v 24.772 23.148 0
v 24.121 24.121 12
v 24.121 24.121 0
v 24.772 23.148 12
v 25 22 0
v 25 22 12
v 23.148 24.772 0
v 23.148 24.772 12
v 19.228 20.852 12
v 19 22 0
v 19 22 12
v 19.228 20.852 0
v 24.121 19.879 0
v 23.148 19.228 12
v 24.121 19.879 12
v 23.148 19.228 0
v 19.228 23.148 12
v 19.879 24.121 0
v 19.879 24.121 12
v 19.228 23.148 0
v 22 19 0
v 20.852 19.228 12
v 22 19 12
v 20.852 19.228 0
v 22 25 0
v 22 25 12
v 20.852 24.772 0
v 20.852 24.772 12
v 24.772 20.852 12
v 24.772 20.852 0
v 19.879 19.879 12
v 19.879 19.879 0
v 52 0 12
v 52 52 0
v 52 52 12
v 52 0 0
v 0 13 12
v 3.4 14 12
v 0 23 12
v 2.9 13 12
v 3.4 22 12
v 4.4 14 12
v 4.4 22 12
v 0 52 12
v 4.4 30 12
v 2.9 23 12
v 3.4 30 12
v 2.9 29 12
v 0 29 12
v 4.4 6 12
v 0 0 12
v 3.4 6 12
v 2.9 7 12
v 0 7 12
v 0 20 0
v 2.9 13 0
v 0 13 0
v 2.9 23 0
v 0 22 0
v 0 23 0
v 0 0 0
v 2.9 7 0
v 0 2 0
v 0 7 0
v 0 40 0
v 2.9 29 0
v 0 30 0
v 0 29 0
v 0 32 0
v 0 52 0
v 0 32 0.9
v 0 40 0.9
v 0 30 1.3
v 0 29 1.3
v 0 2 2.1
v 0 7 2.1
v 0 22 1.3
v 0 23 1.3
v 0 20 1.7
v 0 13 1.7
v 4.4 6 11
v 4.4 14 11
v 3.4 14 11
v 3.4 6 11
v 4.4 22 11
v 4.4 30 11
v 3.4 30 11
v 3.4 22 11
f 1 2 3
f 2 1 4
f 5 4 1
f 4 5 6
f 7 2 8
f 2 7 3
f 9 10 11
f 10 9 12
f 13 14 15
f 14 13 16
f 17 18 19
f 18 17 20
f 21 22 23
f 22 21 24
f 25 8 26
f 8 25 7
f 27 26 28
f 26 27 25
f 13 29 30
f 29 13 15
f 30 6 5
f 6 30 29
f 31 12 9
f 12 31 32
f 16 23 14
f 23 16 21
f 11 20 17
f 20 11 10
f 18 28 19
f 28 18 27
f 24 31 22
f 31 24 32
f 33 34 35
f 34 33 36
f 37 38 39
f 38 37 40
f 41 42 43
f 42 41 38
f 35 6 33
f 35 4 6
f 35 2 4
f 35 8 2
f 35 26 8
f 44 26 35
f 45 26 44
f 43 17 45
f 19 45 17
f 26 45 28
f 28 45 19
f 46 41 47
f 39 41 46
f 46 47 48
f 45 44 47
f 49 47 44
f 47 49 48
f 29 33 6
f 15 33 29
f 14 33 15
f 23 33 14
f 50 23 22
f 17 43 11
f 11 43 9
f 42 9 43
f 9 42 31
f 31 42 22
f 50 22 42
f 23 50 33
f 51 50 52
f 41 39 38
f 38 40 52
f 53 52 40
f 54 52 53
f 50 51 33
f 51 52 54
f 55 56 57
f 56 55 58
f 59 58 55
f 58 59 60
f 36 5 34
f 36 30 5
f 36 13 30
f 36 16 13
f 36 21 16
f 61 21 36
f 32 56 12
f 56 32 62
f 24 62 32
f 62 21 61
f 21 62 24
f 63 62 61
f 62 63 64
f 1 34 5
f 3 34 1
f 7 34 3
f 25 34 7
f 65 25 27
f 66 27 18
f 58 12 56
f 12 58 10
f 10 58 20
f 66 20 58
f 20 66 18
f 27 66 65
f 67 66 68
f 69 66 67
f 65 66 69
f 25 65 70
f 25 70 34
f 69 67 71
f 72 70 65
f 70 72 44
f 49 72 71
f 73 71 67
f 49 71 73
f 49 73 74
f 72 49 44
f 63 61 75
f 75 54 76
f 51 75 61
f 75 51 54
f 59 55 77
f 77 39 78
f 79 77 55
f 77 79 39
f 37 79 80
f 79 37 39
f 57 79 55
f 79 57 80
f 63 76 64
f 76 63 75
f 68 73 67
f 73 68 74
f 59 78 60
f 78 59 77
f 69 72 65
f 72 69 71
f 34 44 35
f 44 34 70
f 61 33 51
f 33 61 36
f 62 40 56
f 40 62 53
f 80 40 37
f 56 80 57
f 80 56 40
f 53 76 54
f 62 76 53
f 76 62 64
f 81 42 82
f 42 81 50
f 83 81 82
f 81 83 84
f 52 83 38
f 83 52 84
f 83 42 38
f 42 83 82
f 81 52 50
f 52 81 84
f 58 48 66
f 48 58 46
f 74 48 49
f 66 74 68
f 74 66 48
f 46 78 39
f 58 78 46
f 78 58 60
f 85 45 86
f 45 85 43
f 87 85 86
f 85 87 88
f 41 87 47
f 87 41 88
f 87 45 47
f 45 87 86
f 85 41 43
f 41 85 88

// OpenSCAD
// Dock-Homing Receiver Fit Jig — 2x TSOP38238 pair template
// ===========================================================================
// Fit-check jig for the BOM "Dock homing sensor" (BOM.md line 57: custom PCB
// with 2x TSOP38238 IR receivers). Tests, against the ACTUAL purchased
// TSOP38238 modules:
//   (a) the datasheet-cited package envelope (5.0 x 4.8 x 6.95 mm) — a
//       drop-through pair template; both modules must drop cleanly through;
//   (b) the receiver PAIR spacing rx_pitch (the critical dock-centering dim) —
//       both modules must drop through simultaneously to register the spacing;
//   (c) FR4 thickness assumption for the eventual chassis pocket — feeler
//       steps 0.8 / 1.2 / 1.6 / 2.0 mm.
//
// Parameter provenance mirrors dock-homing-sensor.scad:
//   tsop_w = 5.0, rxsop_d = 4.8, tsop_h = 6.95 — (datasheet: Vishay TSOP382/384,
//   Doc 82491 rev 2.1, fetched 2026-08-15)
//   tsop_pin_pitch = 2.54 — (datasheet)
//   rx_pitch = 16 — (estimate, re-derive from dock IR design; Jig 16 pass/fail)
//   pcb_thick = 1.6 — (estimate FR4)
// Everything else (estimate) — tune to your printer + actual part.
//
// Pass criteria + fail→fix mapping: PRINT-TEST.md Jig 16.
// License: CC BY-SA 4.0

$fn = 64;

/* [Template dimensions — EDIT] */
tsop_w      =  5.0;   // (datasheet) TSOP38238 package W
rxsop_d     =  4.8;   // (datasheet) TSOP38238 package D (boresight depth)
tsop_h      =  6.95;  // (datasheet) TSOP38238 package H
clear       =  0.5;   // (estimate) PER-SIDE slot clearance: opening = body + 2*clear
                      //   Start 0.5mm; tight→0.3, loose→0.7 (see Jig 16)
pin_pitch   =  2.54;  // (datasheet) lead pitch
rx_pitch    = 16.0;   // (estimate) receiver center-to-center spacing to verify:

// --- Thickness feeler steps ---
step_width  =  8.0;   // mm (estimate) per-step slot width
step_gap    =  2.0;   // mm (estimate)
step_list   = [0.8, 1.2, 1.6, 2.0];  // mm FR4 candidate thicknesses

// --- Template plate ---
plate_xy    = 52;    // footprint (mm)
plate_z     = 12;    // thickness (mm) — drop-through depth, > tsop_h so the
                      //   module fully passes and pokes out both sides

module plate() {
    difference() {
        cube([plate_xy, plate_xy, plate_z]);   // z 0..plate_z
        for (dx = [-1, 1], dy = [-1, 1])
            translate([dx * (plate_xy/2 - 4), dy * (plate_xy/2 - 4), -1])
                cylinder(d = 6, h = plate_z + 2, $fn = 16);
    }
}

module receiver_slot(cy = 0) {
    // Drop-through slot: opening tsop_w x tsop_d (+ 2*clear per side) with a
    // lead-pass channel on the -X (rear) face for the 3 leads on 2.54 pitch
    // (pinning 1=OUT, 2=GND, 3=VS per datasheet). Full plate depth.
    translate([-rxsop_d/2 - clear, cy - tsop_w/2 - clear, -0.1])
        cube([rxsop_d + 2*clear, tsop_w + 2*clear, plate_z + 0.2]);
    // lead channel (through): 4.0 wide in Y, at the rear face
    translate([-rxsop_d/2 - clear - 2.5, cy - 2.0, -0.1])
        cube([2.5, 4.0, plate_z + 0.2]);
    // window-side datum marker: engraved recess on the front (+X) edge so
    // operators insert modules window-first (boresight +X) consistently.
    // Punches through the top surface so it renders as a true recess (a
    // fully-internal subtracted cube would export as a detached shell).
    translate([rxsop_d/2 + clear + 0.5, cy - 4, plate_z - 1.0])
        cube([1.0, 8.0, 1.2]);
}

function cy_place(i) = (i - 1) * rx_pitch + plate_xy/2;  // pocket centers about plate centre

module pitch_witness() {
    // Two engraved witness cross-marks at the ACTUAL template slot spacing so
    // the operator can measure it off the part and confirm rx_pitch.
    for (i = [0 : 1]) {
        translate([-plate_xy/2 + 6, cy_place(i) + rx_pitch/2, plate_z - 0.8])
            cube([14, 0.8, 0.8]);
    }
}

module thickness_feeler() {
    // Four stair slots (0.8/1.2/1.6/2.0mm wide openings) to identify the
    // fabricated dock-homing PCB thickness. PCB edge must enter only its
    // matching step.
    for (i = [0 : len(step_list) - 1]) {
        w = step_list[i];
        y0 = plate_xy - 10 - (i + 1) * (step_width + step_gap);
        translate([-plate_xy/2 + 8, y0, -0.1])
            cube([plate_xy/2 - 8, step_width, w + 0.2]);
    }
}

// ===== ASSEMBLY =====
// Both receiver slots spaced exactly rx_pitch apart about the plate centre;
// checking the real modules against the datasheet envelope AND the pair
// spacing in one pass.
difference() {
    plate();
    receiver_slot(cy_place(0));
    receiver_slot(cy_place(1));
    thickness_feeler();
    pitch_witness();
}
